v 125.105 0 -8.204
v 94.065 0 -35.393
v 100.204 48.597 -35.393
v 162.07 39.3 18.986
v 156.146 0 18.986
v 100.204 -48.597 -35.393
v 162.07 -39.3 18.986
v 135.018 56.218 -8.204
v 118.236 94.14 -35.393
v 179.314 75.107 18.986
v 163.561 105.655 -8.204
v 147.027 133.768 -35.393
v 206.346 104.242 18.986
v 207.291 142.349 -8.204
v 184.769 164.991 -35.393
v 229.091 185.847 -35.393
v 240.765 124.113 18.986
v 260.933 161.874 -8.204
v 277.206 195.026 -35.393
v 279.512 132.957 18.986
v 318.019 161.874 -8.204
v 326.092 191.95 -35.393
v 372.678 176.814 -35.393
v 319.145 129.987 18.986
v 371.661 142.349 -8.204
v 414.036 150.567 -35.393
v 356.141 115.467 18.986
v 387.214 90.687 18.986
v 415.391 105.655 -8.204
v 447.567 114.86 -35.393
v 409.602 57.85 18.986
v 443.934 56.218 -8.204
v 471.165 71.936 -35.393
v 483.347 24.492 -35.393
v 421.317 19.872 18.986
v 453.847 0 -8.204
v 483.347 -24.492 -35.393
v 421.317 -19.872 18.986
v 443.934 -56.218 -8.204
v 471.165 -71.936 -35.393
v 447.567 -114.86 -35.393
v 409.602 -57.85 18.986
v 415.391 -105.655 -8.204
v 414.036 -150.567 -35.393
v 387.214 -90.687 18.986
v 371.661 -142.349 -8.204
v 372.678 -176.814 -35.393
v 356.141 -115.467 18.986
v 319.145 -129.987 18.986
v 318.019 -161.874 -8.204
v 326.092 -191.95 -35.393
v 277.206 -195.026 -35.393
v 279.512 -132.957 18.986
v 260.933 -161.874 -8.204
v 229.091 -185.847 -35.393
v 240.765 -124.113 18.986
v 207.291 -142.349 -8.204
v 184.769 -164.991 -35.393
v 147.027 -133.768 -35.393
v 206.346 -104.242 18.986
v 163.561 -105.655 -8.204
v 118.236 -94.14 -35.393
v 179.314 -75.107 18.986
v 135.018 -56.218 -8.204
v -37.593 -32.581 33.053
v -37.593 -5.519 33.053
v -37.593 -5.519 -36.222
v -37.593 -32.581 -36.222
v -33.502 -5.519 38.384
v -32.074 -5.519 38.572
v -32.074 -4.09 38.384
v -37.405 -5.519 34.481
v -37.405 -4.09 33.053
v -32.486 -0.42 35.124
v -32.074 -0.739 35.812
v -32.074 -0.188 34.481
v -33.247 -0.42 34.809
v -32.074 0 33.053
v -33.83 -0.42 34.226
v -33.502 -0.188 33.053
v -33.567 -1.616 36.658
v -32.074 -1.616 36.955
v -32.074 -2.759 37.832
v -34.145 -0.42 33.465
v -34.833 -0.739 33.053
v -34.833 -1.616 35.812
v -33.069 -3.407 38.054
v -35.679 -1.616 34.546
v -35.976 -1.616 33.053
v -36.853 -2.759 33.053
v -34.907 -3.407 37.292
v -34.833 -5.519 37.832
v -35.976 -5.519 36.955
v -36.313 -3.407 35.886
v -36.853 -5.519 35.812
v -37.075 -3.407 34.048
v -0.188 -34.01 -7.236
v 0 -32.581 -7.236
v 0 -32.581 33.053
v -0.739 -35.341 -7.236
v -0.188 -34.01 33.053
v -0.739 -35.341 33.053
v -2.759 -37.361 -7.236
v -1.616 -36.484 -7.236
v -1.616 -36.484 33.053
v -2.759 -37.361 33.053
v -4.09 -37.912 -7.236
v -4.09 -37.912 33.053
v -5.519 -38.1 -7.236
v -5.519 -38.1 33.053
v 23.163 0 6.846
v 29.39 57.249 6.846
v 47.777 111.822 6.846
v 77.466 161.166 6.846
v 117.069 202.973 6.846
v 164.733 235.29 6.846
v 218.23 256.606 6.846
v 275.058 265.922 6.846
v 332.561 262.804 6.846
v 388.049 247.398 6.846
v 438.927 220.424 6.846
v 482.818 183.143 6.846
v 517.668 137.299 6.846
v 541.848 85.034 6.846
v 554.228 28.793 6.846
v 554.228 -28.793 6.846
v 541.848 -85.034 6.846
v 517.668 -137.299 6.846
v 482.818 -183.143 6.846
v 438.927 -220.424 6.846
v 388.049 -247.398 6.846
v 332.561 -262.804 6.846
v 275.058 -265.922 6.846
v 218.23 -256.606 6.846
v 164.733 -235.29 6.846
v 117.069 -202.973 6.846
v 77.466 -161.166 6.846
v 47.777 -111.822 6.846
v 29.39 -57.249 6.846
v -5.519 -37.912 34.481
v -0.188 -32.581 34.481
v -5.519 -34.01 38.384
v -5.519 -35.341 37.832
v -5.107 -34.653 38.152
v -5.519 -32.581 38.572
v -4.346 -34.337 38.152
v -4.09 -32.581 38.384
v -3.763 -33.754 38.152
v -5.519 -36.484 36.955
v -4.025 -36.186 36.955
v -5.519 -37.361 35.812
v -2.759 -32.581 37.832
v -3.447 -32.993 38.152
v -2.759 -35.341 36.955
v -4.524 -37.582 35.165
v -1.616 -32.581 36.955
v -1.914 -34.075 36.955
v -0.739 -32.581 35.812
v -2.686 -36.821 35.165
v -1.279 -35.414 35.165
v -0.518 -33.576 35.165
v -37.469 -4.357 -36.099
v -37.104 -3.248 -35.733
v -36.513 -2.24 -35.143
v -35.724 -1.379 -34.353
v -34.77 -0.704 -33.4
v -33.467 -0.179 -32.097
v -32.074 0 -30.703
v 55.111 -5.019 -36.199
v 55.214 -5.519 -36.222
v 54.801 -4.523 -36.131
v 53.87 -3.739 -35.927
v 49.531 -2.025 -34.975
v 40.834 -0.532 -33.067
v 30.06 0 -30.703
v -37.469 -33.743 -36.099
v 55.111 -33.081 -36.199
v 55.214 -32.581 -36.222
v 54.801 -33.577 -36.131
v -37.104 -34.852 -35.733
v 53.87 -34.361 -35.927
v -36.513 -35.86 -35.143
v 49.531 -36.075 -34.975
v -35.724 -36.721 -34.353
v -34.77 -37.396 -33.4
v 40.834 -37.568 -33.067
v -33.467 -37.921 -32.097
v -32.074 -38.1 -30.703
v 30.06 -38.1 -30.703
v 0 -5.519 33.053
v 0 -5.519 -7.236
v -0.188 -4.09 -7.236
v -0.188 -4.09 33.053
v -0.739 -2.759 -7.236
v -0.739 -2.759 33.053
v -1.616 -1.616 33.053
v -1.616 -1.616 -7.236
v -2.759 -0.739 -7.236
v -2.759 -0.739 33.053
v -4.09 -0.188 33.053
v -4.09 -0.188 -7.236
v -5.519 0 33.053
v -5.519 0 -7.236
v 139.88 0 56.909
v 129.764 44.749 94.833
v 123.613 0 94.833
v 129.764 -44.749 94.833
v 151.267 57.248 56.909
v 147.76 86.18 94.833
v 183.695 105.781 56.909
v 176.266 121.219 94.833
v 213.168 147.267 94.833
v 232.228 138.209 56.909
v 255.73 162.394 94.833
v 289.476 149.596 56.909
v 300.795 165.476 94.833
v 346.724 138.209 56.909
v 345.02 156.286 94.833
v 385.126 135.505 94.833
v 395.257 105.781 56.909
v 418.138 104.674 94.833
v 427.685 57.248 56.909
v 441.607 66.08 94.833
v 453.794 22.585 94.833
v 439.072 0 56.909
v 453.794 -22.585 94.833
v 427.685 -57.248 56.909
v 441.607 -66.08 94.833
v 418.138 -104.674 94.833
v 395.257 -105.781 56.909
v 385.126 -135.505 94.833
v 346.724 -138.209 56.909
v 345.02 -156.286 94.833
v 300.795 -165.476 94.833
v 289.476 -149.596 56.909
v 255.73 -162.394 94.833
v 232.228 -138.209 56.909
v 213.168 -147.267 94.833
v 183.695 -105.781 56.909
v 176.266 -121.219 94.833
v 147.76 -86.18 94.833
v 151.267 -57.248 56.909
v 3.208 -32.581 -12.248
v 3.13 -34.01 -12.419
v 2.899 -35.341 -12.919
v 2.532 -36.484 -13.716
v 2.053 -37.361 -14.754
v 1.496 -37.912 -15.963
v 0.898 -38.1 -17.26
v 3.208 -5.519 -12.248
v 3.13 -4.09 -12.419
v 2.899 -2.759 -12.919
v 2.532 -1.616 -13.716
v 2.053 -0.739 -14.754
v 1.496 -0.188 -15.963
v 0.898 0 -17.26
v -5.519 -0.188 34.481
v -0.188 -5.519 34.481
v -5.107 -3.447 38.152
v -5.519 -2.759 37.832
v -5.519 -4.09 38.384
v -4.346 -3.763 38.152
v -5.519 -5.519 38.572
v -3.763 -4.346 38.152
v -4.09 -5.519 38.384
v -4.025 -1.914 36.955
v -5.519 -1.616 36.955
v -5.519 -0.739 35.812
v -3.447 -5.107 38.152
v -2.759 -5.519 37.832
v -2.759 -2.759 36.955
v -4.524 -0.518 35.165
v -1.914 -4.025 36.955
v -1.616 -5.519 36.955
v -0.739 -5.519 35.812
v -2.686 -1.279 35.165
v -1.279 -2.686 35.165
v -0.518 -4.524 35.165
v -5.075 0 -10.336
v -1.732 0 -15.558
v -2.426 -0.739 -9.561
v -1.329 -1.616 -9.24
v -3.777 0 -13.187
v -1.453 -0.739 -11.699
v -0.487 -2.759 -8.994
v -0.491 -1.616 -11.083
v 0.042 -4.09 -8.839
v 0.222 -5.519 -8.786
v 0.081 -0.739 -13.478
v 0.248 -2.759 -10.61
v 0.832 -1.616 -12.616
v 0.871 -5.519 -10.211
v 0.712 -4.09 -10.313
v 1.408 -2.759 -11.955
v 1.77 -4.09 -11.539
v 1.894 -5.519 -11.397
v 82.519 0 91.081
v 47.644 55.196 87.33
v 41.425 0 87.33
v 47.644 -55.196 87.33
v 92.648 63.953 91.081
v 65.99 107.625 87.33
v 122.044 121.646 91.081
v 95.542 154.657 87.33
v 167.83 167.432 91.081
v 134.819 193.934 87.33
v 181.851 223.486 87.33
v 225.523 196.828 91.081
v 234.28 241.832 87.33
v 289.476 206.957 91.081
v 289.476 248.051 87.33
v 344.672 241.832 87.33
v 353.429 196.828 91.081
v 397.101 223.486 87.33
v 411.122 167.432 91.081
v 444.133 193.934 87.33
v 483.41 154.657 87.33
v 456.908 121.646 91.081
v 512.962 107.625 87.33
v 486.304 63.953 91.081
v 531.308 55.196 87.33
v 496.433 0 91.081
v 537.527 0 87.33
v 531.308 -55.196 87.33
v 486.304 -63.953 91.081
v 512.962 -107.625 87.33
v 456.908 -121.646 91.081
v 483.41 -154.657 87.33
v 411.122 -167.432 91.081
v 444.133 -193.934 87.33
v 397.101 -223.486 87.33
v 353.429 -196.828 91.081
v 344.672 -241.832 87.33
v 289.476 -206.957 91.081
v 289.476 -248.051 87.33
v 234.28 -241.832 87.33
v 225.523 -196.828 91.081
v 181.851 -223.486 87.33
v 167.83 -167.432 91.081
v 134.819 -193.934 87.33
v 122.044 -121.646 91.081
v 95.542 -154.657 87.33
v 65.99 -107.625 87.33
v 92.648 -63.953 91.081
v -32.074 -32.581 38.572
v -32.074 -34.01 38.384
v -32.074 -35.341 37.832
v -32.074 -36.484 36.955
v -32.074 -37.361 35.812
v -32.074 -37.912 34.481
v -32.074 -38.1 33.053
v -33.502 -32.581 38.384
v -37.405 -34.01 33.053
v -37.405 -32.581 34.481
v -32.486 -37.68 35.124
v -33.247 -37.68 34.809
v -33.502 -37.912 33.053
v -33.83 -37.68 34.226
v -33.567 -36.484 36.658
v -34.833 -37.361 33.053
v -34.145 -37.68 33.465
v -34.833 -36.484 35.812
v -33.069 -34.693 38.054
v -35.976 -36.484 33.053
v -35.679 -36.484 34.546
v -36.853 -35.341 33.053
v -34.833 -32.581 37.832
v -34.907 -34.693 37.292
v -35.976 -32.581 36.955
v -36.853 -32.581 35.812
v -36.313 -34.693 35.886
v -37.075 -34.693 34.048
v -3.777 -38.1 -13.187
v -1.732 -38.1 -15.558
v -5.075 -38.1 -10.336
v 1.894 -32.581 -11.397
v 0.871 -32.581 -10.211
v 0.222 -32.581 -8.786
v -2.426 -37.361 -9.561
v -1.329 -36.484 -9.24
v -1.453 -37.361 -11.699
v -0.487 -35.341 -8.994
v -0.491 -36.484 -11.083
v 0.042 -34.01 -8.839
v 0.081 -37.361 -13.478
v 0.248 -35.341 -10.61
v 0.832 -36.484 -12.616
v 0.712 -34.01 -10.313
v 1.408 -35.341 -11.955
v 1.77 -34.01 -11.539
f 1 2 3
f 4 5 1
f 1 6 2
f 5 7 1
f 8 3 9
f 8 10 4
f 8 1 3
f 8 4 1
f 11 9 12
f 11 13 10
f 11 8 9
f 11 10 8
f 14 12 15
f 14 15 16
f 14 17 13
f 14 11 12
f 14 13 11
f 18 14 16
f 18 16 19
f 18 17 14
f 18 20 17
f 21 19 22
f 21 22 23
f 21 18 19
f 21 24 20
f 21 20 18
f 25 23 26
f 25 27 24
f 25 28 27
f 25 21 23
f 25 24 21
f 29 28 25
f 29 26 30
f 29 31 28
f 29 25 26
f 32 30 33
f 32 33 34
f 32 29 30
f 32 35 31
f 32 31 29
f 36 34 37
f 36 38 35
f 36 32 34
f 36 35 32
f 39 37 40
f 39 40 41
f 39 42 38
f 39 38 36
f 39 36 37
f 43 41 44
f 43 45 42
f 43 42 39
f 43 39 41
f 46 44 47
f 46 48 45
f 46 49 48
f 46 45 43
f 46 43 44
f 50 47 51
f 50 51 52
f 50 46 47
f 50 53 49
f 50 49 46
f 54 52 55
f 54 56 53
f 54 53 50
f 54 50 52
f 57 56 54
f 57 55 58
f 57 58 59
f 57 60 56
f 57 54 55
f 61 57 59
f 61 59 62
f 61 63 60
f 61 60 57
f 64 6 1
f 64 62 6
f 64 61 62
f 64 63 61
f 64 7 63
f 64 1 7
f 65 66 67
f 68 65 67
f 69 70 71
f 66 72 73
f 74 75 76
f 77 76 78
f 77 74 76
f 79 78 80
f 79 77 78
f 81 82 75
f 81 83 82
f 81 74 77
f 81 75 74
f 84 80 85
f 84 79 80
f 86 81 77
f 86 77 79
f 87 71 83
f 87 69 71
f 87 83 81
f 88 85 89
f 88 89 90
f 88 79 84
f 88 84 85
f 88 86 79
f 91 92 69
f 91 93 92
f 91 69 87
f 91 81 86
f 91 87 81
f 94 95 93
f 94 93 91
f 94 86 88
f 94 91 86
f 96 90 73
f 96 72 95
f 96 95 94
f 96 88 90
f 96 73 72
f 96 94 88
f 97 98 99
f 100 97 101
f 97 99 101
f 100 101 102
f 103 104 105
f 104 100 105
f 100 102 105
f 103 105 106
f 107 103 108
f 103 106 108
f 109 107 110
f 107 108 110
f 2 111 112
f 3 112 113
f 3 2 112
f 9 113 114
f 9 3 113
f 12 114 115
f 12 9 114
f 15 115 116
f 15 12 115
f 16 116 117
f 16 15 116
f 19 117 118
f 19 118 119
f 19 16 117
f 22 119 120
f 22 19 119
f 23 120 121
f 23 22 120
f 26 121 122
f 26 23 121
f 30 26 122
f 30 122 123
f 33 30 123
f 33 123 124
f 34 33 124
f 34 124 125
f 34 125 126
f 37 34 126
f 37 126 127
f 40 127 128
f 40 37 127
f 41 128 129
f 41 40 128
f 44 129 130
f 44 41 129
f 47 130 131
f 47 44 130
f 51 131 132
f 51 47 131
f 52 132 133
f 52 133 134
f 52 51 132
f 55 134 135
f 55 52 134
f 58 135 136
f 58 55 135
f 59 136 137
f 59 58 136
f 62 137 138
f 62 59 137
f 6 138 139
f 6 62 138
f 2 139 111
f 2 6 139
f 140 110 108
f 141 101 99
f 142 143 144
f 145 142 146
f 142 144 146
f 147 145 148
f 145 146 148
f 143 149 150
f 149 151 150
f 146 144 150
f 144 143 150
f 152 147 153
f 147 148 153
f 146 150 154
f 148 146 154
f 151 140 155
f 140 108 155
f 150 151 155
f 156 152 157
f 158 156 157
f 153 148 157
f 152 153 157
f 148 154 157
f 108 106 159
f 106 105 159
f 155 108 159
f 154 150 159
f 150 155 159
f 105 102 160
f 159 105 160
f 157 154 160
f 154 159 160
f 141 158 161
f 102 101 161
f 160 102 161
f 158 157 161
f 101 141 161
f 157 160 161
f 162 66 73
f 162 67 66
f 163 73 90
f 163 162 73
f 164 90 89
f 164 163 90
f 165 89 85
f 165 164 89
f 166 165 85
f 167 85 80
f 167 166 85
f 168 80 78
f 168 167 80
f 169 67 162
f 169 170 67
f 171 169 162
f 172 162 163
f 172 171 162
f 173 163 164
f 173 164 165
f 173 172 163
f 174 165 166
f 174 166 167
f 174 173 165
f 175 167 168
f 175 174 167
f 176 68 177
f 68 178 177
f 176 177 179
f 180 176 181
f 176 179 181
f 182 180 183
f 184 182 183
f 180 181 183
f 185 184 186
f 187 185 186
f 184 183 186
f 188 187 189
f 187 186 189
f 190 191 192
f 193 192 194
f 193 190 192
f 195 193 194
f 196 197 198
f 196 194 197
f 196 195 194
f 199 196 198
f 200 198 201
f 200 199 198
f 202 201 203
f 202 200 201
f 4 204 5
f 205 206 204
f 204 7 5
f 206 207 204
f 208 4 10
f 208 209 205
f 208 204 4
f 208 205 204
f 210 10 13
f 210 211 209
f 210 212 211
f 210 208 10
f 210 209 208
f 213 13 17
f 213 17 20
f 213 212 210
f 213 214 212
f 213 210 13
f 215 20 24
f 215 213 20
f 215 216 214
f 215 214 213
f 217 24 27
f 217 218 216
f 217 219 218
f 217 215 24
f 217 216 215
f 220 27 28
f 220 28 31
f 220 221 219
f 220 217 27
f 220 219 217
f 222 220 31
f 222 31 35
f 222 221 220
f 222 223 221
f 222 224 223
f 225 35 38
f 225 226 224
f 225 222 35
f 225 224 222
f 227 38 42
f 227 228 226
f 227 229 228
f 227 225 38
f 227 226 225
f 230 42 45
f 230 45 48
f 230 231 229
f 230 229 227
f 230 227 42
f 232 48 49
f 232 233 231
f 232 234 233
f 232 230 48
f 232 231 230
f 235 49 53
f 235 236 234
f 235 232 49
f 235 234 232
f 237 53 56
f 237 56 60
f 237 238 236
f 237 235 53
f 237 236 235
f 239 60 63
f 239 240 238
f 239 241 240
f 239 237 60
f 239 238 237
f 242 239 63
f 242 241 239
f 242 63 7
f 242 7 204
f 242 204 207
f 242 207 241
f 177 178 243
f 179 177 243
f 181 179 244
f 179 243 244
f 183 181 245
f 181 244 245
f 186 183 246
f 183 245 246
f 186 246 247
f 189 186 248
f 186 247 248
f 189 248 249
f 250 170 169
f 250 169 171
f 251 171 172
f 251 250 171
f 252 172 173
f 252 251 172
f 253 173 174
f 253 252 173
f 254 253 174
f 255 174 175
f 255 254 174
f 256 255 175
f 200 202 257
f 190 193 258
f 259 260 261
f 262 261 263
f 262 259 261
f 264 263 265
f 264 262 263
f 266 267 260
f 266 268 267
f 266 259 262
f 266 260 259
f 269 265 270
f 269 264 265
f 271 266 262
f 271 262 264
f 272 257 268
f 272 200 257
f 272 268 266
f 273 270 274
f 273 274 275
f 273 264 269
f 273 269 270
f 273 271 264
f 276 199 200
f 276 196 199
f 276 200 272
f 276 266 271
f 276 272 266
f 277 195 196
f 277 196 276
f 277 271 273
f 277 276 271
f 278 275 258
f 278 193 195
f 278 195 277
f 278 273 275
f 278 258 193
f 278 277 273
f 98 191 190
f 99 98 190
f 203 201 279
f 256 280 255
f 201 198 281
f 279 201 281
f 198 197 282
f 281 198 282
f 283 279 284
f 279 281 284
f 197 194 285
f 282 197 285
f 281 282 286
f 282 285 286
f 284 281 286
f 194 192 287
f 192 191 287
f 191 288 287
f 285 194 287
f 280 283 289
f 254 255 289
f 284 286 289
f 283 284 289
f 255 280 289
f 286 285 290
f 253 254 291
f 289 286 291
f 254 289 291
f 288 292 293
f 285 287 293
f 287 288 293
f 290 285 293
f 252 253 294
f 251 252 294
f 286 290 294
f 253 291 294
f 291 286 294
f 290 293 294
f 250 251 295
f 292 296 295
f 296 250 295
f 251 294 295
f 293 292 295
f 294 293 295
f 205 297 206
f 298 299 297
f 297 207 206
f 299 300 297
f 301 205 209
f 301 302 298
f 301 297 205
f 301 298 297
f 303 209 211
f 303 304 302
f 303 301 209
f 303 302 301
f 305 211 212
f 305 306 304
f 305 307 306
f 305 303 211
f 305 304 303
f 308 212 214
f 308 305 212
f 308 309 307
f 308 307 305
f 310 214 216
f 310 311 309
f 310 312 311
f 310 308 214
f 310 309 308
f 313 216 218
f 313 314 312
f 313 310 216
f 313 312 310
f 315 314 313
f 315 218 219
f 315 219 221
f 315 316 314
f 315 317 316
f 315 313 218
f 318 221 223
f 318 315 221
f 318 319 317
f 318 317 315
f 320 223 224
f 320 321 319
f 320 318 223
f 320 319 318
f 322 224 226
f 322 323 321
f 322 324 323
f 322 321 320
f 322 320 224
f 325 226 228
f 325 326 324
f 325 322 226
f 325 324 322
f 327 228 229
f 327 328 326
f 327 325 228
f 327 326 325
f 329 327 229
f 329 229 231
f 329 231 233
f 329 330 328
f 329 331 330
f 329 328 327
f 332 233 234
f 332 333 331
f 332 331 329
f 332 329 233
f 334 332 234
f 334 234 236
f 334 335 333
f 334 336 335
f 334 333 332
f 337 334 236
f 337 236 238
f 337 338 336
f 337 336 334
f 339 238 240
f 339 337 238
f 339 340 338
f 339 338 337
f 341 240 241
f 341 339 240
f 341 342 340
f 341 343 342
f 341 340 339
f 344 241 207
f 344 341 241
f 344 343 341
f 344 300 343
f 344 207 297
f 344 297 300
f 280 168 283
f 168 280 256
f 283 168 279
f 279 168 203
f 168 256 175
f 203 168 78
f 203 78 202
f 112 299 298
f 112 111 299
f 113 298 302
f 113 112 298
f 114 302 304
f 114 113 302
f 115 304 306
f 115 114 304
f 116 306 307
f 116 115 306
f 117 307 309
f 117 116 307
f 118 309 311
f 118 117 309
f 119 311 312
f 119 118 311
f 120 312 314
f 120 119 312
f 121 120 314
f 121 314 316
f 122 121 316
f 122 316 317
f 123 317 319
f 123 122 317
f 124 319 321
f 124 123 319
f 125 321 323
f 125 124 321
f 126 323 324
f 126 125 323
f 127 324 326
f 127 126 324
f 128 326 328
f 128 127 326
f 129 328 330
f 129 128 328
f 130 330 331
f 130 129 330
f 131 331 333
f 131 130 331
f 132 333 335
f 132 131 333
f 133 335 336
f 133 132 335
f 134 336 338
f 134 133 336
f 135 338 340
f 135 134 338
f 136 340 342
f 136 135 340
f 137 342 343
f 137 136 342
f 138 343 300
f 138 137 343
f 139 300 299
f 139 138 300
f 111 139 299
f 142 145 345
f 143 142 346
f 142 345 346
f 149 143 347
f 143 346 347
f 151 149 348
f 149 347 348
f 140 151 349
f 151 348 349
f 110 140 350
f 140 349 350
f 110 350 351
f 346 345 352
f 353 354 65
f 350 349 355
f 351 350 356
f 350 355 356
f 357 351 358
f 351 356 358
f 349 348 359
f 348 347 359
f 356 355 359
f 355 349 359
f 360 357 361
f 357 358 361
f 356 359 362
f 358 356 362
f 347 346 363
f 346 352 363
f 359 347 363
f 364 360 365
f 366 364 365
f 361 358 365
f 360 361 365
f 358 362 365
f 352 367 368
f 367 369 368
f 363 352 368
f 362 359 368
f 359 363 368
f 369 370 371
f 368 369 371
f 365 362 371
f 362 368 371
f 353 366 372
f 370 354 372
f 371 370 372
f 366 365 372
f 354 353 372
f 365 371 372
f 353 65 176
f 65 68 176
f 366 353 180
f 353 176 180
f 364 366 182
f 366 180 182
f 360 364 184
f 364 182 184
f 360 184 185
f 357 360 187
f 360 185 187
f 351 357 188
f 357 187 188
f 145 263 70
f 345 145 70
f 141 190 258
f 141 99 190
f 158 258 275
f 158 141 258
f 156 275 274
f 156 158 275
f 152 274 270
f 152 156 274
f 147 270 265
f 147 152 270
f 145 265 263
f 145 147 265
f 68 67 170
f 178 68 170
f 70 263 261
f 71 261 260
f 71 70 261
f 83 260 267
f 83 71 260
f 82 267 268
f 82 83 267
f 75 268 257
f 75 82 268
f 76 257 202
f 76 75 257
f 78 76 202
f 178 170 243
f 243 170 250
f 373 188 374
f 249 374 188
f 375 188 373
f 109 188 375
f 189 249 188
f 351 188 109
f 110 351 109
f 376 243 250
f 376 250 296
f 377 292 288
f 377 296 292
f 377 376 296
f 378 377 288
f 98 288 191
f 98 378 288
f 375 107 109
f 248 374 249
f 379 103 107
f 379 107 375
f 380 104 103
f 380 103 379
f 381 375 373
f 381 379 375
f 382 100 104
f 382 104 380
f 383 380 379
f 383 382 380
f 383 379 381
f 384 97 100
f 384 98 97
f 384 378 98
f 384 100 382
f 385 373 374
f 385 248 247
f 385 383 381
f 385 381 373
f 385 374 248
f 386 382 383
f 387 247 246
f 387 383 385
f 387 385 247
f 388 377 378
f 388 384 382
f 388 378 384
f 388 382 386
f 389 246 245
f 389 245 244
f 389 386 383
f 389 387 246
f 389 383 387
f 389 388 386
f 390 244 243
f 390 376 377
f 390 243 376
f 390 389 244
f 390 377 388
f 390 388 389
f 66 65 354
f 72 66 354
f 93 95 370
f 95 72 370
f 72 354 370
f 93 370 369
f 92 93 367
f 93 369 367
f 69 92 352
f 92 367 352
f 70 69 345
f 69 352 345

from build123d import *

# Parameters (mm, degrees)
F1_DEPTH = 38.1
F2_R     = 5.518892


with BuildPart() as f1:
    # F0 (on Front) → F1 (new body)
    with BuildSketch(Plane.XZ):
        Polygon((-37.592728, 38.571715), (-37.592728, 35.438985), (-37.592728, -36.222164), (55.214331, -36.222164), (0, -10.76875), (0, 38.571715), align=None)
    extrude(amount=F1_DEPTH)

    # F2
    f2_edges = [f1.edges().sort_by_distance(p)[0] for p in [
        (-37.592728, -19.05, 38.571715),
        (0, -19.05, -10.76875),
        (0, -38.1, 13.901483),
        (-18.796364, -38.1, 38.571715),
        (-37.592728, -38.1, 1.174776),
        (8.810801, -38.1, -36.222164),
        (27.607165, -38.1, -23.495457),
        (0, 0, 13.901483),
        (-18.796364, 0, 38.571715),
        (-37.592728, 0, 1.174776),
        (8.810801, 0, -36.222164),
        (27.607165, 0, -23.495457),
        (0, -19.05, 38.571715),
    ]]
    fillet(f2_edges, radius=F2_R)


with BuildPart() as f4:
    # F3 (on Front) → F4 (revolve)
    with BuildSketch(Plane.XZ):
        Polygon((23.163289, 6.846157), (94.064608, -35.392904), (156.146054, 18.985671), (123.613179, 94.832538), (41.42531, 87.329906), align=None)
    revolve(axis=Axis((289.476007, 0, 35.568487), (0, 0, -1)))


solid = Compound([f1.part, f4.part])
